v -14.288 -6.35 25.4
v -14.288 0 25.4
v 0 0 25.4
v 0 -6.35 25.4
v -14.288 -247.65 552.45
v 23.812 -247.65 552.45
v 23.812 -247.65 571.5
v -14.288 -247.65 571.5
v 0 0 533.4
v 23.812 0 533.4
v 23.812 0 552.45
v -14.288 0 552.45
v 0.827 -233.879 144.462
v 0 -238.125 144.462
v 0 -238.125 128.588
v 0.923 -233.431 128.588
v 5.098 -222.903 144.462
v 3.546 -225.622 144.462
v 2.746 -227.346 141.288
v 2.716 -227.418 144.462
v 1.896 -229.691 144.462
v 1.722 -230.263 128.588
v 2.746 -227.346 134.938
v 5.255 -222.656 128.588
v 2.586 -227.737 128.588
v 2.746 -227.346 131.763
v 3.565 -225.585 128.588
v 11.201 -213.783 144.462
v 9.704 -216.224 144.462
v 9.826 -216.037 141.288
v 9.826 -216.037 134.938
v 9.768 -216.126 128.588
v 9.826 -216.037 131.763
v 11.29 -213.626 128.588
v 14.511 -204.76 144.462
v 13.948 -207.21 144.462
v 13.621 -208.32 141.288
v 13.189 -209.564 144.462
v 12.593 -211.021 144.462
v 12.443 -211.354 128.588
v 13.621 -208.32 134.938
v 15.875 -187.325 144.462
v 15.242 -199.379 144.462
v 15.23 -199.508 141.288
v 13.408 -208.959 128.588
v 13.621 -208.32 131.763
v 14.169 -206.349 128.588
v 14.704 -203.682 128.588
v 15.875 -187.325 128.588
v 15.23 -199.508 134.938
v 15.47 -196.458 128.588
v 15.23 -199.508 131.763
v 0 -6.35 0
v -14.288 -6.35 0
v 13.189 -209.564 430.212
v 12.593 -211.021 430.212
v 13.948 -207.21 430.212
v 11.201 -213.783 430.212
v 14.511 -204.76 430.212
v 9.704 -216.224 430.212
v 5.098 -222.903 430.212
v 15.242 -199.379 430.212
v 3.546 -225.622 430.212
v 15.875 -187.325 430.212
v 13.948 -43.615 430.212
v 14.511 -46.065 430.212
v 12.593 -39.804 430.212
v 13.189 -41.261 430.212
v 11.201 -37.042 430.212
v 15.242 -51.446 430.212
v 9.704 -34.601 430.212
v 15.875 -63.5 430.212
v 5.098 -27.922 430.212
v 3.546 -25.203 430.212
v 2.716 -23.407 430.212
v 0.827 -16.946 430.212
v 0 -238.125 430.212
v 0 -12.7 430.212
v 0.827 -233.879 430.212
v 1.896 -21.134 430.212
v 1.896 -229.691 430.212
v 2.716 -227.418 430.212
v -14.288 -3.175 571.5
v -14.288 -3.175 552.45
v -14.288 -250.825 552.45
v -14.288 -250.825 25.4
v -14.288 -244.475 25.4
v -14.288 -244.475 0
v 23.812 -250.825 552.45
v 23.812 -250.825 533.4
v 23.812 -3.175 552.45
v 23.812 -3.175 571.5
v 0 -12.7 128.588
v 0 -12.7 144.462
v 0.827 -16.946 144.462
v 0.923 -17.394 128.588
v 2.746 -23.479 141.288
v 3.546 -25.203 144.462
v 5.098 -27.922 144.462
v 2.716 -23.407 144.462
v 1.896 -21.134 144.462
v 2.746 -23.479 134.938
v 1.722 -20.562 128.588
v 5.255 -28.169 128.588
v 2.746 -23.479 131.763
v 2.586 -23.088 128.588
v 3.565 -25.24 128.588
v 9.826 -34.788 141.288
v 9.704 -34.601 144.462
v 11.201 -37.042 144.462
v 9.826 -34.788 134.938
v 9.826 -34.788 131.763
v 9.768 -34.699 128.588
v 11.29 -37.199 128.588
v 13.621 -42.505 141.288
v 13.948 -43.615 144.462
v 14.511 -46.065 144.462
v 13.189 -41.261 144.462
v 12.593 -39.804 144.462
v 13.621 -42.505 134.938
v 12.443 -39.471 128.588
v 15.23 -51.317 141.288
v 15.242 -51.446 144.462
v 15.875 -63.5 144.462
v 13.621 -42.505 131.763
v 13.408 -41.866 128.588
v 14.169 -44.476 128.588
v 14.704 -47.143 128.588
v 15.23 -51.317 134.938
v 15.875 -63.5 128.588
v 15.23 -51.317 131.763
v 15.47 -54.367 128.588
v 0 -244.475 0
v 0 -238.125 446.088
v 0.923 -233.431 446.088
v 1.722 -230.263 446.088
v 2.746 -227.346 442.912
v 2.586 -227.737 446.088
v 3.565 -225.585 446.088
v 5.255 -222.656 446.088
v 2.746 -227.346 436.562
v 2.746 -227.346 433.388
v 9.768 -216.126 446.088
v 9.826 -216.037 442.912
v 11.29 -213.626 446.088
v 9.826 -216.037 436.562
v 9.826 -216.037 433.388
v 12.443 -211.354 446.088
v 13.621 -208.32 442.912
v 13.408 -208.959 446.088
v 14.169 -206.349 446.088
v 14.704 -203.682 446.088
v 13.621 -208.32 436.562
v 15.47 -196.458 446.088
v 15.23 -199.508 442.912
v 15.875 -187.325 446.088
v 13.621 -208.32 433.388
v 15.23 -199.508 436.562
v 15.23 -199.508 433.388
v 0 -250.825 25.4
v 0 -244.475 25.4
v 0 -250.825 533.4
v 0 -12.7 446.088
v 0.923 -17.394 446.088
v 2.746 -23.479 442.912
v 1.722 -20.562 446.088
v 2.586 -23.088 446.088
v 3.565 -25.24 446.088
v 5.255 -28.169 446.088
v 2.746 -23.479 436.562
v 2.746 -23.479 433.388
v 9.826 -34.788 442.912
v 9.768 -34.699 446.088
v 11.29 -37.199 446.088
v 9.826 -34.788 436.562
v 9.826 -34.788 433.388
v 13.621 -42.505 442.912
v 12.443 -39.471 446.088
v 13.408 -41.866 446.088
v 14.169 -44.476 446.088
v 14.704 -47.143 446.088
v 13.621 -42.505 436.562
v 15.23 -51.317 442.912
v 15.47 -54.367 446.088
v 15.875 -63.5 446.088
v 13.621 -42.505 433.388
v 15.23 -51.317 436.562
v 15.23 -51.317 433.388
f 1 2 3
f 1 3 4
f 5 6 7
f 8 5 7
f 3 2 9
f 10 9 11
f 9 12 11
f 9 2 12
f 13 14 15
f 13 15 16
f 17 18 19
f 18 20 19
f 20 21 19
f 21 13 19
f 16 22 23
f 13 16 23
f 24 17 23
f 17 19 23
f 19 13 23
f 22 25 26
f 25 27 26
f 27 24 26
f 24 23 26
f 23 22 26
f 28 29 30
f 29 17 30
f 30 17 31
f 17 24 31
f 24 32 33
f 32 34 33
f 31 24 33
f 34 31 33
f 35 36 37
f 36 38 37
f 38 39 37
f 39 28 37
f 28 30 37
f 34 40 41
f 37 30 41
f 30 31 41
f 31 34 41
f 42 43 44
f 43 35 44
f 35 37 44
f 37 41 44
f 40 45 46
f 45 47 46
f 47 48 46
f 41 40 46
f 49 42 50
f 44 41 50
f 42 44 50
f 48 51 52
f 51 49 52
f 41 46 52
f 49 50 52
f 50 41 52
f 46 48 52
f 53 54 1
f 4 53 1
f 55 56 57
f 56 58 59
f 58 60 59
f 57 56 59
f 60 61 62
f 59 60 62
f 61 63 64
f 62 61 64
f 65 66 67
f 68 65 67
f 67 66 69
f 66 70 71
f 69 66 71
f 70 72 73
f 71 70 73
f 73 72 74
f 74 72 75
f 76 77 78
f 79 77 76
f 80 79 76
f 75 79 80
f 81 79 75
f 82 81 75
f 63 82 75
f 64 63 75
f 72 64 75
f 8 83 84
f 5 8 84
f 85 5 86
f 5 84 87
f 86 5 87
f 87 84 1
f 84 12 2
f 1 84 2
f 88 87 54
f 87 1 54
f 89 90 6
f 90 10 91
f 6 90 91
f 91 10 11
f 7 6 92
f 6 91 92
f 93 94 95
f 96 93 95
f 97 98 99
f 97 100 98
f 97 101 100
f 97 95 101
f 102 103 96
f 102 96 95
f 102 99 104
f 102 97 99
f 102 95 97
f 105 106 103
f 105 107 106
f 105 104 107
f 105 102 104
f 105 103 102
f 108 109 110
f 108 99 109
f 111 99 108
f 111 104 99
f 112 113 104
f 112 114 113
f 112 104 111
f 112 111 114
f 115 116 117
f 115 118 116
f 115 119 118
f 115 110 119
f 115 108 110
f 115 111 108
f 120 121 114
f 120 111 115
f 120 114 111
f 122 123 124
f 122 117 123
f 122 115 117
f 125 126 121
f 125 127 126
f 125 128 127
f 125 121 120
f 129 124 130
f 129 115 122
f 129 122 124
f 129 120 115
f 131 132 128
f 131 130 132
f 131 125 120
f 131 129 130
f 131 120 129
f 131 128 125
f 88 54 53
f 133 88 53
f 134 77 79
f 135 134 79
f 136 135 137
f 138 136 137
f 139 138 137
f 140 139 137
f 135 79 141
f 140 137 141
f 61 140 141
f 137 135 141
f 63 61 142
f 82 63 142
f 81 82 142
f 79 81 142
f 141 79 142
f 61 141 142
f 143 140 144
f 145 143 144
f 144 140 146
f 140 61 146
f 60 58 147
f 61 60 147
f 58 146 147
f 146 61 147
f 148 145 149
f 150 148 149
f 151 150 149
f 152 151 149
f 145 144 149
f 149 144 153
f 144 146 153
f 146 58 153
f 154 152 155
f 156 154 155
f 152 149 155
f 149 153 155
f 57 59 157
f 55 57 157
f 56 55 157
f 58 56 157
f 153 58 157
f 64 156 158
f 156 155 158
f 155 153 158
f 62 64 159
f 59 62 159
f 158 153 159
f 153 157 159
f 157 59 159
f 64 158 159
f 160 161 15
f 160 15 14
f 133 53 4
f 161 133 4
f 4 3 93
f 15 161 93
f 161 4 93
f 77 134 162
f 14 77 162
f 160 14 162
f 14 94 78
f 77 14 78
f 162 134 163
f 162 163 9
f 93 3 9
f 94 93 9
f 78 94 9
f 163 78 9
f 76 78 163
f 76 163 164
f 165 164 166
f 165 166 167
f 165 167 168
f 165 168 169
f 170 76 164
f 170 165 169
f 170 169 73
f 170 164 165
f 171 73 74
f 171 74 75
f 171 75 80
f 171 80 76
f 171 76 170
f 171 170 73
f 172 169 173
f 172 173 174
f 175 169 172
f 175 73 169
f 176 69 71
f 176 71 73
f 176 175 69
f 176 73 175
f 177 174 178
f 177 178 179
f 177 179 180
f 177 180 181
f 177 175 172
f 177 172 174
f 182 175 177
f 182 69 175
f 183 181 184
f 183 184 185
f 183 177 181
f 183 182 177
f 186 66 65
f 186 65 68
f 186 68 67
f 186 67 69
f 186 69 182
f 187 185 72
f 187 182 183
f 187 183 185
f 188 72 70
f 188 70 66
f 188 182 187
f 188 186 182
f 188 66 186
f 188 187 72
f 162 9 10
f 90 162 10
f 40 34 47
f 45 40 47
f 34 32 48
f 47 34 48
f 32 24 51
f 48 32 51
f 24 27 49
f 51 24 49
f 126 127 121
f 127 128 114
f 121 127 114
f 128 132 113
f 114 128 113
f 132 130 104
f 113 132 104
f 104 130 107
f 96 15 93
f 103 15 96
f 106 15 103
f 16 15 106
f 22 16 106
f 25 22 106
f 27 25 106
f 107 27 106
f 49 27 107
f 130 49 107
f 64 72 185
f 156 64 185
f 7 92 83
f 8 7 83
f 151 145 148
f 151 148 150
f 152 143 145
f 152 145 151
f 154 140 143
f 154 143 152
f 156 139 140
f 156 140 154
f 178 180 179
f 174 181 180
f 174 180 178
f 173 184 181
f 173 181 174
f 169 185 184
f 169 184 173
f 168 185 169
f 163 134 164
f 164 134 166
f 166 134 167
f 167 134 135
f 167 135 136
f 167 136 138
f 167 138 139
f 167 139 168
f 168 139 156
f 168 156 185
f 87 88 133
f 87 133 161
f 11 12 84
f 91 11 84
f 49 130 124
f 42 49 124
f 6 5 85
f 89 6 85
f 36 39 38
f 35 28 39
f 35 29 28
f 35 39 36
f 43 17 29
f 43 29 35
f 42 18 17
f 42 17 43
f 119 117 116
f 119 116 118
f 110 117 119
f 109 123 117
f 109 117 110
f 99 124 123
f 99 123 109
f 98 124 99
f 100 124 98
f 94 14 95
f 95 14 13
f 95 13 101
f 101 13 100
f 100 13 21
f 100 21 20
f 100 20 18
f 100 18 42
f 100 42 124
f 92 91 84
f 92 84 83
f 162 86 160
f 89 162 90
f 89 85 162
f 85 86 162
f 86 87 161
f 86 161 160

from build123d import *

# Parameters (mm, degrees)
F0_W     = 15.875
F0_H     = 15.875
F1_DEPTH = 250.825
F4_DEPTH = 317.5
F2_W     = 6.35
F2_H     = 25.4
F2_W_2   = 3.175
F2_H_2   = 19.05
F5_DEPTH = 38.101


with BuildPart() as f1:
    # F0 (on Front) → F1 (new body)
    with BuildSketch(Plane.XZ):
        Polygon((-14.2875, 571.5), (-14.2875, 552.45), (0, 552.45), (0, 533.4), (23.8125, 533.4), (23.8125, 571.5), align=None)
        with Locations((7.9375, 438.15)):
            Rectangle(F0_W, F0_H)
        Polygon((-14.2875, 0), (0, 0), (0, 128.5875), (0, 144.4625), (0, 430.2125), (0, 446.0875), (0, 533.4), (0, 552.45), (-14.2875, 552.45), align=None)
        with Locations((7.9375, 136.525)):
            Rectangle(F0_W, F0_H)
    extrude(amount=F1_DEPTH)

    # F3 (on face) → F4 (cut, through all)
    with BuildSketch(Plane(origin=(0, 0, 128.5875), x_dir=(1, 0, 0), z_dir=(0, 0, -1))):
        with BuildLine():
            Line((0, 250.825), (0, 238.125))
            add(Edge.make_bspline(
                [(0, 238.125), (0.6926233759, 234.4606029013), (1.9236757367, 227.3559423783), (7.1384263146, 219.8390585837), (9.937069342, 216.0543113654), (15.004380788, 207.4287550118), (15.5609760484, 196.837061745), (15.875, 187.325)],
                knots=[0, 0, 0, 0, 0.20885854, 0.3936531927, 0.5285953381, 0.7122340762, 1, 1, 1, 1], degree=3))
            Line((15.875, 187.325), (15.875, 250.825))
            Line((15.875, 250.825), (0, 250.825))
        make_face()
        with BuildLine():
            add(Edge.make_bspline(
                [(0, 12.7), (0.6926233759, 16.3643970987), (1.9236757367, 23.4690576217), (7.1384263146, 30.9859414163), (9.937069342, 34.7706886346), (15.004380788, 43.3962449882), (15.5609760484, 53.987938255), (15.875, 63.5)],
                knots=[0, 0, 0, 0, 0.20885854, 0.3936531927, 0.5285953381, 0.7122340762, 1, 1, 1, 1], degree=3))
            Line((0, 12.7), (0, 0))
            Line((0, 0), (15.875, 0))
            Line((15.875, 0), (15.875, 63.5))
        make_face()
    extrude(amount=-F4_DEPTH, mode=Mode.SUBTRACT)

    # F2 (on face) → F5 (cut, through all)
    with BuildSketch(Plane(origin=(-14.2875, 0, 0), x_dir=(0, -1, 0), z_dir=(-1, 0, 0))):
        with Locations((3.175, 12.7)):
            Rectangle(F2_W, F2_H)
        with Locations((247.65, 12.7)):
            Rectangle(F2_W, F2_H)
        with Locations((249.2375, 561.975)):
            Rectangle(F2_W_2, F2_H_2)
        with Locations((1.5875, 561.975)):
            Rectangle(F2_W_2, F2_H_2)
    extrude(amount=-F5_DEPTH, mode=Mode.SUBTRACT)


solid = f1.part
